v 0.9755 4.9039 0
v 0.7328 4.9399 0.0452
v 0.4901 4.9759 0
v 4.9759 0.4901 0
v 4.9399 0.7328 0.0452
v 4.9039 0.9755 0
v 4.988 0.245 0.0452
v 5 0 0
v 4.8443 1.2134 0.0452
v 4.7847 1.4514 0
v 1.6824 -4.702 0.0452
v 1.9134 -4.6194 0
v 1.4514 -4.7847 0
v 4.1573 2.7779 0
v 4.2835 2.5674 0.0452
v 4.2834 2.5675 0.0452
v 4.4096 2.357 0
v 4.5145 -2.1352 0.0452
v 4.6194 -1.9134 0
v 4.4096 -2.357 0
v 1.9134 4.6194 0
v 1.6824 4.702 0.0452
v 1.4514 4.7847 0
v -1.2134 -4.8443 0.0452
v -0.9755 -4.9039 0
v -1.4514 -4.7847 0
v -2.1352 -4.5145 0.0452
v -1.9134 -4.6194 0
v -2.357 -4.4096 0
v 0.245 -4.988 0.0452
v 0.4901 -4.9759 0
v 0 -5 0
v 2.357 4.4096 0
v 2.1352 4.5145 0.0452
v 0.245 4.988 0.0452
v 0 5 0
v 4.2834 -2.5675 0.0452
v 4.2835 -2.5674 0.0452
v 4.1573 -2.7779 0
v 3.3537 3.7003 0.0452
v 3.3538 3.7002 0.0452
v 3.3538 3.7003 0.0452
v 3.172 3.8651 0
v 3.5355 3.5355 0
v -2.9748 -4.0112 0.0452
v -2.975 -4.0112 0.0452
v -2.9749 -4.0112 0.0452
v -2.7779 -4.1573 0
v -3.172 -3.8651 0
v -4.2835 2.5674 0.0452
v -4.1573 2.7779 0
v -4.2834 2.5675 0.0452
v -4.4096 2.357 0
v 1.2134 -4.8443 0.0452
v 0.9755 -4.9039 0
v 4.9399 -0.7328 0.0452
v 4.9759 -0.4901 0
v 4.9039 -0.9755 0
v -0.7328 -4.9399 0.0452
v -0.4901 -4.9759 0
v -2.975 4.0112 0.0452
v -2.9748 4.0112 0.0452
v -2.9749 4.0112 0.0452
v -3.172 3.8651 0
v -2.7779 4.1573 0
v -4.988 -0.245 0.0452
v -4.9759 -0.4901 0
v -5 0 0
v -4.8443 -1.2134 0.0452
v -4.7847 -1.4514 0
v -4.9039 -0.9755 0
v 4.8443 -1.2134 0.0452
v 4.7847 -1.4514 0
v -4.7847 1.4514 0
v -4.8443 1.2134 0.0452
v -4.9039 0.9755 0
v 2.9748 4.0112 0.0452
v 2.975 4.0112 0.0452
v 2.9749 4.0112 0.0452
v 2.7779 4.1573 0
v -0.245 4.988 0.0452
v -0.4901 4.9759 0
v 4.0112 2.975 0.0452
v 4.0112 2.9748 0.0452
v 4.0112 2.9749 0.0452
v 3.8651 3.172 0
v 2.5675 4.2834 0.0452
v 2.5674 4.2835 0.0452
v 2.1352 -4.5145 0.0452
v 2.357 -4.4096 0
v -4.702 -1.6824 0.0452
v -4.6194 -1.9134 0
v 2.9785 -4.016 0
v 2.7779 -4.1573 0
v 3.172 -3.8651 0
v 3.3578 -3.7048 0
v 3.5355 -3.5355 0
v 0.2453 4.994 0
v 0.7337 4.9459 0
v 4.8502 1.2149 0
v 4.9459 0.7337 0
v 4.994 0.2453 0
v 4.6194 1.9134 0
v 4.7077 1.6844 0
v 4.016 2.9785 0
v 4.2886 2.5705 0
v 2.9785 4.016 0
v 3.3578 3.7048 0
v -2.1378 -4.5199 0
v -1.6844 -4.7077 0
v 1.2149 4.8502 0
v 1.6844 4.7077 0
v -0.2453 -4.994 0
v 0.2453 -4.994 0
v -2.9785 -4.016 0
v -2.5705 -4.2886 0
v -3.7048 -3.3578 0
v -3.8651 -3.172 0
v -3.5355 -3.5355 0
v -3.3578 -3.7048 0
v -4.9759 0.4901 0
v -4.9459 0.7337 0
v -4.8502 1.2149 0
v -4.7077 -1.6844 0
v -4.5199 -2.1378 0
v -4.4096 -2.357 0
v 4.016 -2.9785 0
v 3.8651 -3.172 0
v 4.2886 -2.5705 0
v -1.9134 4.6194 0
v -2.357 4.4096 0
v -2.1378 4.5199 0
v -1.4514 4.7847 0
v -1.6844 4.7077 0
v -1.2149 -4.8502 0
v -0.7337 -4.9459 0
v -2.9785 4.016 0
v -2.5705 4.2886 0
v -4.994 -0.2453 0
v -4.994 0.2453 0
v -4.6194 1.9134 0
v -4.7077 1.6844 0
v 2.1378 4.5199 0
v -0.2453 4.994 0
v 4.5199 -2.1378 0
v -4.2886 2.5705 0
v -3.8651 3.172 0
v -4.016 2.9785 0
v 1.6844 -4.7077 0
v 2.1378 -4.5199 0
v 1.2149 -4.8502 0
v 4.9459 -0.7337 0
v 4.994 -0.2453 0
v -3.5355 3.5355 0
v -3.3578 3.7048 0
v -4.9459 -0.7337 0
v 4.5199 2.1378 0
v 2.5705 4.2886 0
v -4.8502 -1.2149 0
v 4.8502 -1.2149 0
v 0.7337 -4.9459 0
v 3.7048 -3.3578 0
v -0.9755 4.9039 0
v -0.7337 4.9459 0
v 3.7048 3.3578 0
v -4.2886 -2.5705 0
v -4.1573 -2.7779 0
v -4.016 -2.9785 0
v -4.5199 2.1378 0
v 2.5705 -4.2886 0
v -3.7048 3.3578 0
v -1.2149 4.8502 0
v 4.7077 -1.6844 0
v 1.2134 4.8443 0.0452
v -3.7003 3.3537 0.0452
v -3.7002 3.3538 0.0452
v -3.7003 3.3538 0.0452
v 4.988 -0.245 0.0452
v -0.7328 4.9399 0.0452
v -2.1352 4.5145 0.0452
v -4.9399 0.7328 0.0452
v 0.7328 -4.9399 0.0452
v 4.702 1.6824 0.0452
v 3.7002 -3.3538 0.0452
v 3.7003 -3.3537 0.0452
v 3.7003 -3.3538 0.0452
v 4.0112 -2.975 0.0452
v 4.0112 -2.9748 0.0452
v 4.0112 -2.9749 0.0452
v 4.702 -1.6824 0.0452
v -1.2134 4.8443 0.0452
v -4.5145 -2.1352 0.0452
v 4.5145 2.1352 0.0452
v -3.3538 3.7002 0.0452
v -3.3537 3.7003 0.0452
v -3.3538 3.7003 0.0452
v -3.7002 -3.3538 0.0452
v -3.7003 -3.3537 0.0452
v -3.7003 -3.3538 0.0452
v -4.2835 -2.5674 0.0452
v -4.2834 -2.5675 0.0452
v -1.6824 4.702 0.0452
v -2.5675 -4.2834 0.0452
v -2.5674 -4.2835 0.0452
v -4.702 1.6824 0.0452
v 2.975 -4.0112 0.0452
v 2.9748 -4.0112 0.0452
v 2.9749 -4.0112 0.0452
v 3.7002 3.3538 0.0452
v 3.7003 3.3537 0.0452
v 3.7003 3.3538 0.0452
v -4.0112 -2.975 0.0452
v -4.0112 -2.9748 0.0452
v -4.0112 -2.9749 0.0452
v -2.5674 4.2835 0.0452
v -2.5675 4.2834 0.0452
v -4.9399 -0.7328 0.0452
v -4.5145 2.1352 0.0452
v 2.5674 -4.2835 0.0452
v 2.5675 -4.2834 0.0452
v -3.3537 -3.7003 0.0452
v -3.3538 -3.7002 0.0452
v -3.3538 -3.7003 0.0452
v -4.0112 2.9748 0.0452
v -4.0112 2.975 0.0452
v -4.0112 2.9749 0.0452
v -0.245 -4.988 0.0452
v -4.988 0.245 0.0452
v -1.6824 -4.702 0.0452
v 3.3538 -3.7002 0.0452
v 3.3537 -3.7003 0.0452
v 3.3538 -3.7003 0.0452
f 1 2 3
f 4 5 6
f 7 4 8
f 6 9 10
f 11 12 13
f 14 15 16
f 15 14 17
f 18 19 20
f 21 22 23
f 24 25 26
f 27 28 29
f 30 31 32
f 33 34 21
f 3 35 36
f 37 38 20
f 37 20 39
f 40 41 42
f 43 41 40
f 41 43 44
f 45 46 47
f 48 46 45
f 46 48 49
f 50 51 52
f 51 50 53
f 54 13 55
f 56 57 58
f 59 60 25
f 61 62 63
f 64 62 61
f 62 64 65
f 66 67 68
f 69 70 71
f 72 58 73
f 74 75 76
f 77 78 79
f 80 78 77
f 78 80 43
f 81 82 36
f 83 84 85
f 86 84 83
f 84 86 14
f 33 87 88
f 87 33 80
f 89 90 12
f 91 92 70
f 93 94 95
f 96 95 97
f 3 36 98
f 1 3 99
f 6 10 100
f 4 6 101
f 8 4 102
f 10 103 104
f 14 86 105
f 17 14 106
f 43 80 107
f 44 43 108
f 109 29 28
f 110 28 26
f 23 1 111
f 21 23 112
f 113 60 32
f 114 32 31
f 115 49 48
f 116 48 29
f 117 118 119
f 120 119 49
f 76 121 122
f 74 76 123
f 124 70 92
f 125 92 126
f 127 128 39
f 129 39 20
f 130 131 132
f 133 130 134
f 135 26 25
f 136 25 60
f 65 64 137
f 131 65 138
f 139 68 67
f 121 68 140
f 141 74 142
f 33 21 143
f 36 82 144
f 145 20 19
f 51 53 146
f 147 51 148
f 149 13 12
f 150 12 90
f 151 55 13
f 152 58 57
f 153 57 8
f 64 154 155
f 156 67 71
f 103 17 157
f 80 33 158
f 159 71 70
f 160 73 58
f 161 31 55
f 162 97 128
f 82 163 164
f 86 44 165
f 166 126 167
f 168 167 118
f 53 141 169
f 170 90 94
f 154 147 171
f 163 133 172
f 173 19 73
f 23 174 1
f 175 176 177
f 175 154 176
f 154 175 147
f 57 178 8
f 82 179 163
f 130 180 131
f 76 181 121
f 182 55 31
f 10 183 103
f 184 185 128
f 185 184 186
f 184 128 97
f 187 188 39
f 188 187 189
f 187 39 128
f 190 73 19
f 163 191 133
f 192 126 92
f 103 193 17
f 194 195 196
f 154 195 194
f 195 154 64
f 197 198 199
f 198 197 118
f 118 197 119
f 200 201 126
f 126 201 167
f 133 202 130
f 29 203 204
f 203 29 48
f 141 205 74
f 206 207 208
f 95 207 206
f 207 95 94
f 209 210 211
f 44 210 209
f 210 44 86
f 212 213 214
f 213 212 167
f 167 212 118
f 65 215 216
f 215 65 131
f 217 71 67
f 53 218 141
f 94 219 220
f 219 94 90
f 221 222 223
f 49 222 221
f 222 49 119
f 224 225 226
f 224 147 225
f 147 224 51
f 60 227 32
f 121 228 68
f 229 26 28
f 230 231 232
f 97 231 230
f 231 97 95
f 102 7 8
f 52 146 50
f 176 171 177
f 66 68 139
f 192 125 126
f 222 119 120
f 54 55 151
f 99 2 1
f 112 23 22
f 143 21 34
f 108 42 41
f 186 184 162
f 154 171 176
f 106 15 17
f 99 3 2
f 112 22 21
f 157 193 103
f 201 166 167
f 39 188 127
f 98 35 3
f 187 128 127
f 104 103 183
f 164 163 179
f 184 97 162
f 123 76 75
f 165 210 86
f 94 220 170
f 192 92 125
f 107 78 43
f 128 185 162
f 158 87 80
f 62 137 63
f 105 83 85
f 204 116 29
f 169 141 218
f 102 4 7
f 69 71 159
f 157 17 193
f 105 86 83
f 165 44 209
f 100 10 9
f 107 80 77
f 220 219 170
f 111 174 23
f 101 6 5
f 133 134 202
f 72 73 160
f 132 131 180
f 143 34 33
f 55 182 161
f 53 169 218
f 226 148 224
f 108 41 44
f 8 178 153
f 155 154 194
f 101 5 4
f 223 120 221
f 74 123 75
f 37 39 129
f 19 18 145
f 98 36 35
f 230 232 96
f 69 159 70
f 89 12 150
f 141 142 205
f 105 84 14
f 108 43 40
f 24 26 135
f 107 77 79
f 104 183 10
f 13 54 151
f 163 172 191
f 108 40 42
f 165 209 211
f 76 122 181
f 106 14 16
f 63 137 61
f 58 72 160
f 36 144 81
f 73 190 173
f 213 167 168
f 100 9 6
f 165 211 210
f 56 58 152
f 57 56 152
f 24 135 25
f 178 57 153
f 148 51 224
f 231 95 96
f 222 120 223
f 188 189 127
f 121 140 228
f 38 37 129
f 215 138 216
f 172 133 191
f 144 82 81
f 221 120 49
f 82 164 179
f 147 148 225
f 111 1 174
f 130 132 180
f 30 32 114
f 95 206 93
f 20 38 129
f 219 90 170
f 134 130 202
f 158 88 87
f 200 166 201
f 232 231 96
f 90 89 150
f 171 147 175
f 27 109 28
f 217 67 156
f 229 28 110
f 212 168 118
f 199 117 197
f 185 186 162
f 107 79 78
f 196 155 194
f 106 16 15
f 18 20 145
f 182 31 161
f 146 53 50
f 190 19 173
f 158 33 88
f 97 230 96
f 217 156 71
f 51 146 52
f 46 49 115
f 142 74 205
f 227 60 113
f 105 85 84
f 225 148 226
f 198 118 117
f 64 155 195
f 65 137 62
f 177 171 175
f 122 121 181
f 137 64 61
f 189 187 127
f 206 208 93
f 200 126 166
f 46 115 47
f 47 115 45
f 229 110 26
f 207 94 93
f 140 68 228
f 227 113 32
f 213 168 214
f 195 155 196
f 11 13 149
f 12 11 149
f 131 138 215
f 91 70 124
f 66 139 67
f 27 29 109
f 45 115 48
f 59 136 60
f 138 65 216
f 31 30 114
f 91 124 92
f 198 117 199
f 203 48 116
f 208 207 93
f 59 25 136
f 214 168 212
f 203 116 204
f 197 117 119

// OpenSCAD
// Lab funnel - printed upright, wide opening at the top
// Units: mm. Straight spout (tube) from z = 0 to z = 20,
// then a cone widens to the rim at z = 50. Wall 1.6 mm thick.

$fn = 64;

// ---- Dimensions ----
spout_d        = 10;   // spout outer diameter
spout_bore     = 6.8;  // spout bore (tube) diameter
spout_h        = 20;   // spout height (z = 0 to z = 20)
cone_top_d     = 10;   // cone outer diameter at z = 20 (top of spout)
cone_rim_d     = 60;   // cone outer diameter at the rim (z = 50)
wall           = 1.6;  // wall thickness everywhere
eps            = 0.5;  // cutter overshoot past faces

// ---- Derived ----
cone_rim_h      = 50;                        // rim height (z = 50)
cone_slope      = (cone_rim_d - cone_top_d) / (cone_rim_h - spout_h);  // 1 mm per 1.667 mm Z
cone_bore_d     = spout_bore + 2 * wall;     // bore diameter through the cone (8.4 mm)

// ---- Model ----
difference() {
    union() {
        // Spout: tube 10 mm OD, 6.8 mm bore, z = 0 to z = 20
        cylinder(d = spout_d, h = spout_h);
        
        // Cone: OD 10 mm at z = 20, 60 mm at z = 50
        cylinder(d1 = cone_top_d, h = cone_rim_h - spout_h, $fn = 128);
    }
    
    // Through-hole: 8.4 mm diameter from z = 0 to z = 50
    translate([0, 0, -eps])
        cylinder(d = cone_bore_d, h = cone_rim_h + 2 * eps);
}
